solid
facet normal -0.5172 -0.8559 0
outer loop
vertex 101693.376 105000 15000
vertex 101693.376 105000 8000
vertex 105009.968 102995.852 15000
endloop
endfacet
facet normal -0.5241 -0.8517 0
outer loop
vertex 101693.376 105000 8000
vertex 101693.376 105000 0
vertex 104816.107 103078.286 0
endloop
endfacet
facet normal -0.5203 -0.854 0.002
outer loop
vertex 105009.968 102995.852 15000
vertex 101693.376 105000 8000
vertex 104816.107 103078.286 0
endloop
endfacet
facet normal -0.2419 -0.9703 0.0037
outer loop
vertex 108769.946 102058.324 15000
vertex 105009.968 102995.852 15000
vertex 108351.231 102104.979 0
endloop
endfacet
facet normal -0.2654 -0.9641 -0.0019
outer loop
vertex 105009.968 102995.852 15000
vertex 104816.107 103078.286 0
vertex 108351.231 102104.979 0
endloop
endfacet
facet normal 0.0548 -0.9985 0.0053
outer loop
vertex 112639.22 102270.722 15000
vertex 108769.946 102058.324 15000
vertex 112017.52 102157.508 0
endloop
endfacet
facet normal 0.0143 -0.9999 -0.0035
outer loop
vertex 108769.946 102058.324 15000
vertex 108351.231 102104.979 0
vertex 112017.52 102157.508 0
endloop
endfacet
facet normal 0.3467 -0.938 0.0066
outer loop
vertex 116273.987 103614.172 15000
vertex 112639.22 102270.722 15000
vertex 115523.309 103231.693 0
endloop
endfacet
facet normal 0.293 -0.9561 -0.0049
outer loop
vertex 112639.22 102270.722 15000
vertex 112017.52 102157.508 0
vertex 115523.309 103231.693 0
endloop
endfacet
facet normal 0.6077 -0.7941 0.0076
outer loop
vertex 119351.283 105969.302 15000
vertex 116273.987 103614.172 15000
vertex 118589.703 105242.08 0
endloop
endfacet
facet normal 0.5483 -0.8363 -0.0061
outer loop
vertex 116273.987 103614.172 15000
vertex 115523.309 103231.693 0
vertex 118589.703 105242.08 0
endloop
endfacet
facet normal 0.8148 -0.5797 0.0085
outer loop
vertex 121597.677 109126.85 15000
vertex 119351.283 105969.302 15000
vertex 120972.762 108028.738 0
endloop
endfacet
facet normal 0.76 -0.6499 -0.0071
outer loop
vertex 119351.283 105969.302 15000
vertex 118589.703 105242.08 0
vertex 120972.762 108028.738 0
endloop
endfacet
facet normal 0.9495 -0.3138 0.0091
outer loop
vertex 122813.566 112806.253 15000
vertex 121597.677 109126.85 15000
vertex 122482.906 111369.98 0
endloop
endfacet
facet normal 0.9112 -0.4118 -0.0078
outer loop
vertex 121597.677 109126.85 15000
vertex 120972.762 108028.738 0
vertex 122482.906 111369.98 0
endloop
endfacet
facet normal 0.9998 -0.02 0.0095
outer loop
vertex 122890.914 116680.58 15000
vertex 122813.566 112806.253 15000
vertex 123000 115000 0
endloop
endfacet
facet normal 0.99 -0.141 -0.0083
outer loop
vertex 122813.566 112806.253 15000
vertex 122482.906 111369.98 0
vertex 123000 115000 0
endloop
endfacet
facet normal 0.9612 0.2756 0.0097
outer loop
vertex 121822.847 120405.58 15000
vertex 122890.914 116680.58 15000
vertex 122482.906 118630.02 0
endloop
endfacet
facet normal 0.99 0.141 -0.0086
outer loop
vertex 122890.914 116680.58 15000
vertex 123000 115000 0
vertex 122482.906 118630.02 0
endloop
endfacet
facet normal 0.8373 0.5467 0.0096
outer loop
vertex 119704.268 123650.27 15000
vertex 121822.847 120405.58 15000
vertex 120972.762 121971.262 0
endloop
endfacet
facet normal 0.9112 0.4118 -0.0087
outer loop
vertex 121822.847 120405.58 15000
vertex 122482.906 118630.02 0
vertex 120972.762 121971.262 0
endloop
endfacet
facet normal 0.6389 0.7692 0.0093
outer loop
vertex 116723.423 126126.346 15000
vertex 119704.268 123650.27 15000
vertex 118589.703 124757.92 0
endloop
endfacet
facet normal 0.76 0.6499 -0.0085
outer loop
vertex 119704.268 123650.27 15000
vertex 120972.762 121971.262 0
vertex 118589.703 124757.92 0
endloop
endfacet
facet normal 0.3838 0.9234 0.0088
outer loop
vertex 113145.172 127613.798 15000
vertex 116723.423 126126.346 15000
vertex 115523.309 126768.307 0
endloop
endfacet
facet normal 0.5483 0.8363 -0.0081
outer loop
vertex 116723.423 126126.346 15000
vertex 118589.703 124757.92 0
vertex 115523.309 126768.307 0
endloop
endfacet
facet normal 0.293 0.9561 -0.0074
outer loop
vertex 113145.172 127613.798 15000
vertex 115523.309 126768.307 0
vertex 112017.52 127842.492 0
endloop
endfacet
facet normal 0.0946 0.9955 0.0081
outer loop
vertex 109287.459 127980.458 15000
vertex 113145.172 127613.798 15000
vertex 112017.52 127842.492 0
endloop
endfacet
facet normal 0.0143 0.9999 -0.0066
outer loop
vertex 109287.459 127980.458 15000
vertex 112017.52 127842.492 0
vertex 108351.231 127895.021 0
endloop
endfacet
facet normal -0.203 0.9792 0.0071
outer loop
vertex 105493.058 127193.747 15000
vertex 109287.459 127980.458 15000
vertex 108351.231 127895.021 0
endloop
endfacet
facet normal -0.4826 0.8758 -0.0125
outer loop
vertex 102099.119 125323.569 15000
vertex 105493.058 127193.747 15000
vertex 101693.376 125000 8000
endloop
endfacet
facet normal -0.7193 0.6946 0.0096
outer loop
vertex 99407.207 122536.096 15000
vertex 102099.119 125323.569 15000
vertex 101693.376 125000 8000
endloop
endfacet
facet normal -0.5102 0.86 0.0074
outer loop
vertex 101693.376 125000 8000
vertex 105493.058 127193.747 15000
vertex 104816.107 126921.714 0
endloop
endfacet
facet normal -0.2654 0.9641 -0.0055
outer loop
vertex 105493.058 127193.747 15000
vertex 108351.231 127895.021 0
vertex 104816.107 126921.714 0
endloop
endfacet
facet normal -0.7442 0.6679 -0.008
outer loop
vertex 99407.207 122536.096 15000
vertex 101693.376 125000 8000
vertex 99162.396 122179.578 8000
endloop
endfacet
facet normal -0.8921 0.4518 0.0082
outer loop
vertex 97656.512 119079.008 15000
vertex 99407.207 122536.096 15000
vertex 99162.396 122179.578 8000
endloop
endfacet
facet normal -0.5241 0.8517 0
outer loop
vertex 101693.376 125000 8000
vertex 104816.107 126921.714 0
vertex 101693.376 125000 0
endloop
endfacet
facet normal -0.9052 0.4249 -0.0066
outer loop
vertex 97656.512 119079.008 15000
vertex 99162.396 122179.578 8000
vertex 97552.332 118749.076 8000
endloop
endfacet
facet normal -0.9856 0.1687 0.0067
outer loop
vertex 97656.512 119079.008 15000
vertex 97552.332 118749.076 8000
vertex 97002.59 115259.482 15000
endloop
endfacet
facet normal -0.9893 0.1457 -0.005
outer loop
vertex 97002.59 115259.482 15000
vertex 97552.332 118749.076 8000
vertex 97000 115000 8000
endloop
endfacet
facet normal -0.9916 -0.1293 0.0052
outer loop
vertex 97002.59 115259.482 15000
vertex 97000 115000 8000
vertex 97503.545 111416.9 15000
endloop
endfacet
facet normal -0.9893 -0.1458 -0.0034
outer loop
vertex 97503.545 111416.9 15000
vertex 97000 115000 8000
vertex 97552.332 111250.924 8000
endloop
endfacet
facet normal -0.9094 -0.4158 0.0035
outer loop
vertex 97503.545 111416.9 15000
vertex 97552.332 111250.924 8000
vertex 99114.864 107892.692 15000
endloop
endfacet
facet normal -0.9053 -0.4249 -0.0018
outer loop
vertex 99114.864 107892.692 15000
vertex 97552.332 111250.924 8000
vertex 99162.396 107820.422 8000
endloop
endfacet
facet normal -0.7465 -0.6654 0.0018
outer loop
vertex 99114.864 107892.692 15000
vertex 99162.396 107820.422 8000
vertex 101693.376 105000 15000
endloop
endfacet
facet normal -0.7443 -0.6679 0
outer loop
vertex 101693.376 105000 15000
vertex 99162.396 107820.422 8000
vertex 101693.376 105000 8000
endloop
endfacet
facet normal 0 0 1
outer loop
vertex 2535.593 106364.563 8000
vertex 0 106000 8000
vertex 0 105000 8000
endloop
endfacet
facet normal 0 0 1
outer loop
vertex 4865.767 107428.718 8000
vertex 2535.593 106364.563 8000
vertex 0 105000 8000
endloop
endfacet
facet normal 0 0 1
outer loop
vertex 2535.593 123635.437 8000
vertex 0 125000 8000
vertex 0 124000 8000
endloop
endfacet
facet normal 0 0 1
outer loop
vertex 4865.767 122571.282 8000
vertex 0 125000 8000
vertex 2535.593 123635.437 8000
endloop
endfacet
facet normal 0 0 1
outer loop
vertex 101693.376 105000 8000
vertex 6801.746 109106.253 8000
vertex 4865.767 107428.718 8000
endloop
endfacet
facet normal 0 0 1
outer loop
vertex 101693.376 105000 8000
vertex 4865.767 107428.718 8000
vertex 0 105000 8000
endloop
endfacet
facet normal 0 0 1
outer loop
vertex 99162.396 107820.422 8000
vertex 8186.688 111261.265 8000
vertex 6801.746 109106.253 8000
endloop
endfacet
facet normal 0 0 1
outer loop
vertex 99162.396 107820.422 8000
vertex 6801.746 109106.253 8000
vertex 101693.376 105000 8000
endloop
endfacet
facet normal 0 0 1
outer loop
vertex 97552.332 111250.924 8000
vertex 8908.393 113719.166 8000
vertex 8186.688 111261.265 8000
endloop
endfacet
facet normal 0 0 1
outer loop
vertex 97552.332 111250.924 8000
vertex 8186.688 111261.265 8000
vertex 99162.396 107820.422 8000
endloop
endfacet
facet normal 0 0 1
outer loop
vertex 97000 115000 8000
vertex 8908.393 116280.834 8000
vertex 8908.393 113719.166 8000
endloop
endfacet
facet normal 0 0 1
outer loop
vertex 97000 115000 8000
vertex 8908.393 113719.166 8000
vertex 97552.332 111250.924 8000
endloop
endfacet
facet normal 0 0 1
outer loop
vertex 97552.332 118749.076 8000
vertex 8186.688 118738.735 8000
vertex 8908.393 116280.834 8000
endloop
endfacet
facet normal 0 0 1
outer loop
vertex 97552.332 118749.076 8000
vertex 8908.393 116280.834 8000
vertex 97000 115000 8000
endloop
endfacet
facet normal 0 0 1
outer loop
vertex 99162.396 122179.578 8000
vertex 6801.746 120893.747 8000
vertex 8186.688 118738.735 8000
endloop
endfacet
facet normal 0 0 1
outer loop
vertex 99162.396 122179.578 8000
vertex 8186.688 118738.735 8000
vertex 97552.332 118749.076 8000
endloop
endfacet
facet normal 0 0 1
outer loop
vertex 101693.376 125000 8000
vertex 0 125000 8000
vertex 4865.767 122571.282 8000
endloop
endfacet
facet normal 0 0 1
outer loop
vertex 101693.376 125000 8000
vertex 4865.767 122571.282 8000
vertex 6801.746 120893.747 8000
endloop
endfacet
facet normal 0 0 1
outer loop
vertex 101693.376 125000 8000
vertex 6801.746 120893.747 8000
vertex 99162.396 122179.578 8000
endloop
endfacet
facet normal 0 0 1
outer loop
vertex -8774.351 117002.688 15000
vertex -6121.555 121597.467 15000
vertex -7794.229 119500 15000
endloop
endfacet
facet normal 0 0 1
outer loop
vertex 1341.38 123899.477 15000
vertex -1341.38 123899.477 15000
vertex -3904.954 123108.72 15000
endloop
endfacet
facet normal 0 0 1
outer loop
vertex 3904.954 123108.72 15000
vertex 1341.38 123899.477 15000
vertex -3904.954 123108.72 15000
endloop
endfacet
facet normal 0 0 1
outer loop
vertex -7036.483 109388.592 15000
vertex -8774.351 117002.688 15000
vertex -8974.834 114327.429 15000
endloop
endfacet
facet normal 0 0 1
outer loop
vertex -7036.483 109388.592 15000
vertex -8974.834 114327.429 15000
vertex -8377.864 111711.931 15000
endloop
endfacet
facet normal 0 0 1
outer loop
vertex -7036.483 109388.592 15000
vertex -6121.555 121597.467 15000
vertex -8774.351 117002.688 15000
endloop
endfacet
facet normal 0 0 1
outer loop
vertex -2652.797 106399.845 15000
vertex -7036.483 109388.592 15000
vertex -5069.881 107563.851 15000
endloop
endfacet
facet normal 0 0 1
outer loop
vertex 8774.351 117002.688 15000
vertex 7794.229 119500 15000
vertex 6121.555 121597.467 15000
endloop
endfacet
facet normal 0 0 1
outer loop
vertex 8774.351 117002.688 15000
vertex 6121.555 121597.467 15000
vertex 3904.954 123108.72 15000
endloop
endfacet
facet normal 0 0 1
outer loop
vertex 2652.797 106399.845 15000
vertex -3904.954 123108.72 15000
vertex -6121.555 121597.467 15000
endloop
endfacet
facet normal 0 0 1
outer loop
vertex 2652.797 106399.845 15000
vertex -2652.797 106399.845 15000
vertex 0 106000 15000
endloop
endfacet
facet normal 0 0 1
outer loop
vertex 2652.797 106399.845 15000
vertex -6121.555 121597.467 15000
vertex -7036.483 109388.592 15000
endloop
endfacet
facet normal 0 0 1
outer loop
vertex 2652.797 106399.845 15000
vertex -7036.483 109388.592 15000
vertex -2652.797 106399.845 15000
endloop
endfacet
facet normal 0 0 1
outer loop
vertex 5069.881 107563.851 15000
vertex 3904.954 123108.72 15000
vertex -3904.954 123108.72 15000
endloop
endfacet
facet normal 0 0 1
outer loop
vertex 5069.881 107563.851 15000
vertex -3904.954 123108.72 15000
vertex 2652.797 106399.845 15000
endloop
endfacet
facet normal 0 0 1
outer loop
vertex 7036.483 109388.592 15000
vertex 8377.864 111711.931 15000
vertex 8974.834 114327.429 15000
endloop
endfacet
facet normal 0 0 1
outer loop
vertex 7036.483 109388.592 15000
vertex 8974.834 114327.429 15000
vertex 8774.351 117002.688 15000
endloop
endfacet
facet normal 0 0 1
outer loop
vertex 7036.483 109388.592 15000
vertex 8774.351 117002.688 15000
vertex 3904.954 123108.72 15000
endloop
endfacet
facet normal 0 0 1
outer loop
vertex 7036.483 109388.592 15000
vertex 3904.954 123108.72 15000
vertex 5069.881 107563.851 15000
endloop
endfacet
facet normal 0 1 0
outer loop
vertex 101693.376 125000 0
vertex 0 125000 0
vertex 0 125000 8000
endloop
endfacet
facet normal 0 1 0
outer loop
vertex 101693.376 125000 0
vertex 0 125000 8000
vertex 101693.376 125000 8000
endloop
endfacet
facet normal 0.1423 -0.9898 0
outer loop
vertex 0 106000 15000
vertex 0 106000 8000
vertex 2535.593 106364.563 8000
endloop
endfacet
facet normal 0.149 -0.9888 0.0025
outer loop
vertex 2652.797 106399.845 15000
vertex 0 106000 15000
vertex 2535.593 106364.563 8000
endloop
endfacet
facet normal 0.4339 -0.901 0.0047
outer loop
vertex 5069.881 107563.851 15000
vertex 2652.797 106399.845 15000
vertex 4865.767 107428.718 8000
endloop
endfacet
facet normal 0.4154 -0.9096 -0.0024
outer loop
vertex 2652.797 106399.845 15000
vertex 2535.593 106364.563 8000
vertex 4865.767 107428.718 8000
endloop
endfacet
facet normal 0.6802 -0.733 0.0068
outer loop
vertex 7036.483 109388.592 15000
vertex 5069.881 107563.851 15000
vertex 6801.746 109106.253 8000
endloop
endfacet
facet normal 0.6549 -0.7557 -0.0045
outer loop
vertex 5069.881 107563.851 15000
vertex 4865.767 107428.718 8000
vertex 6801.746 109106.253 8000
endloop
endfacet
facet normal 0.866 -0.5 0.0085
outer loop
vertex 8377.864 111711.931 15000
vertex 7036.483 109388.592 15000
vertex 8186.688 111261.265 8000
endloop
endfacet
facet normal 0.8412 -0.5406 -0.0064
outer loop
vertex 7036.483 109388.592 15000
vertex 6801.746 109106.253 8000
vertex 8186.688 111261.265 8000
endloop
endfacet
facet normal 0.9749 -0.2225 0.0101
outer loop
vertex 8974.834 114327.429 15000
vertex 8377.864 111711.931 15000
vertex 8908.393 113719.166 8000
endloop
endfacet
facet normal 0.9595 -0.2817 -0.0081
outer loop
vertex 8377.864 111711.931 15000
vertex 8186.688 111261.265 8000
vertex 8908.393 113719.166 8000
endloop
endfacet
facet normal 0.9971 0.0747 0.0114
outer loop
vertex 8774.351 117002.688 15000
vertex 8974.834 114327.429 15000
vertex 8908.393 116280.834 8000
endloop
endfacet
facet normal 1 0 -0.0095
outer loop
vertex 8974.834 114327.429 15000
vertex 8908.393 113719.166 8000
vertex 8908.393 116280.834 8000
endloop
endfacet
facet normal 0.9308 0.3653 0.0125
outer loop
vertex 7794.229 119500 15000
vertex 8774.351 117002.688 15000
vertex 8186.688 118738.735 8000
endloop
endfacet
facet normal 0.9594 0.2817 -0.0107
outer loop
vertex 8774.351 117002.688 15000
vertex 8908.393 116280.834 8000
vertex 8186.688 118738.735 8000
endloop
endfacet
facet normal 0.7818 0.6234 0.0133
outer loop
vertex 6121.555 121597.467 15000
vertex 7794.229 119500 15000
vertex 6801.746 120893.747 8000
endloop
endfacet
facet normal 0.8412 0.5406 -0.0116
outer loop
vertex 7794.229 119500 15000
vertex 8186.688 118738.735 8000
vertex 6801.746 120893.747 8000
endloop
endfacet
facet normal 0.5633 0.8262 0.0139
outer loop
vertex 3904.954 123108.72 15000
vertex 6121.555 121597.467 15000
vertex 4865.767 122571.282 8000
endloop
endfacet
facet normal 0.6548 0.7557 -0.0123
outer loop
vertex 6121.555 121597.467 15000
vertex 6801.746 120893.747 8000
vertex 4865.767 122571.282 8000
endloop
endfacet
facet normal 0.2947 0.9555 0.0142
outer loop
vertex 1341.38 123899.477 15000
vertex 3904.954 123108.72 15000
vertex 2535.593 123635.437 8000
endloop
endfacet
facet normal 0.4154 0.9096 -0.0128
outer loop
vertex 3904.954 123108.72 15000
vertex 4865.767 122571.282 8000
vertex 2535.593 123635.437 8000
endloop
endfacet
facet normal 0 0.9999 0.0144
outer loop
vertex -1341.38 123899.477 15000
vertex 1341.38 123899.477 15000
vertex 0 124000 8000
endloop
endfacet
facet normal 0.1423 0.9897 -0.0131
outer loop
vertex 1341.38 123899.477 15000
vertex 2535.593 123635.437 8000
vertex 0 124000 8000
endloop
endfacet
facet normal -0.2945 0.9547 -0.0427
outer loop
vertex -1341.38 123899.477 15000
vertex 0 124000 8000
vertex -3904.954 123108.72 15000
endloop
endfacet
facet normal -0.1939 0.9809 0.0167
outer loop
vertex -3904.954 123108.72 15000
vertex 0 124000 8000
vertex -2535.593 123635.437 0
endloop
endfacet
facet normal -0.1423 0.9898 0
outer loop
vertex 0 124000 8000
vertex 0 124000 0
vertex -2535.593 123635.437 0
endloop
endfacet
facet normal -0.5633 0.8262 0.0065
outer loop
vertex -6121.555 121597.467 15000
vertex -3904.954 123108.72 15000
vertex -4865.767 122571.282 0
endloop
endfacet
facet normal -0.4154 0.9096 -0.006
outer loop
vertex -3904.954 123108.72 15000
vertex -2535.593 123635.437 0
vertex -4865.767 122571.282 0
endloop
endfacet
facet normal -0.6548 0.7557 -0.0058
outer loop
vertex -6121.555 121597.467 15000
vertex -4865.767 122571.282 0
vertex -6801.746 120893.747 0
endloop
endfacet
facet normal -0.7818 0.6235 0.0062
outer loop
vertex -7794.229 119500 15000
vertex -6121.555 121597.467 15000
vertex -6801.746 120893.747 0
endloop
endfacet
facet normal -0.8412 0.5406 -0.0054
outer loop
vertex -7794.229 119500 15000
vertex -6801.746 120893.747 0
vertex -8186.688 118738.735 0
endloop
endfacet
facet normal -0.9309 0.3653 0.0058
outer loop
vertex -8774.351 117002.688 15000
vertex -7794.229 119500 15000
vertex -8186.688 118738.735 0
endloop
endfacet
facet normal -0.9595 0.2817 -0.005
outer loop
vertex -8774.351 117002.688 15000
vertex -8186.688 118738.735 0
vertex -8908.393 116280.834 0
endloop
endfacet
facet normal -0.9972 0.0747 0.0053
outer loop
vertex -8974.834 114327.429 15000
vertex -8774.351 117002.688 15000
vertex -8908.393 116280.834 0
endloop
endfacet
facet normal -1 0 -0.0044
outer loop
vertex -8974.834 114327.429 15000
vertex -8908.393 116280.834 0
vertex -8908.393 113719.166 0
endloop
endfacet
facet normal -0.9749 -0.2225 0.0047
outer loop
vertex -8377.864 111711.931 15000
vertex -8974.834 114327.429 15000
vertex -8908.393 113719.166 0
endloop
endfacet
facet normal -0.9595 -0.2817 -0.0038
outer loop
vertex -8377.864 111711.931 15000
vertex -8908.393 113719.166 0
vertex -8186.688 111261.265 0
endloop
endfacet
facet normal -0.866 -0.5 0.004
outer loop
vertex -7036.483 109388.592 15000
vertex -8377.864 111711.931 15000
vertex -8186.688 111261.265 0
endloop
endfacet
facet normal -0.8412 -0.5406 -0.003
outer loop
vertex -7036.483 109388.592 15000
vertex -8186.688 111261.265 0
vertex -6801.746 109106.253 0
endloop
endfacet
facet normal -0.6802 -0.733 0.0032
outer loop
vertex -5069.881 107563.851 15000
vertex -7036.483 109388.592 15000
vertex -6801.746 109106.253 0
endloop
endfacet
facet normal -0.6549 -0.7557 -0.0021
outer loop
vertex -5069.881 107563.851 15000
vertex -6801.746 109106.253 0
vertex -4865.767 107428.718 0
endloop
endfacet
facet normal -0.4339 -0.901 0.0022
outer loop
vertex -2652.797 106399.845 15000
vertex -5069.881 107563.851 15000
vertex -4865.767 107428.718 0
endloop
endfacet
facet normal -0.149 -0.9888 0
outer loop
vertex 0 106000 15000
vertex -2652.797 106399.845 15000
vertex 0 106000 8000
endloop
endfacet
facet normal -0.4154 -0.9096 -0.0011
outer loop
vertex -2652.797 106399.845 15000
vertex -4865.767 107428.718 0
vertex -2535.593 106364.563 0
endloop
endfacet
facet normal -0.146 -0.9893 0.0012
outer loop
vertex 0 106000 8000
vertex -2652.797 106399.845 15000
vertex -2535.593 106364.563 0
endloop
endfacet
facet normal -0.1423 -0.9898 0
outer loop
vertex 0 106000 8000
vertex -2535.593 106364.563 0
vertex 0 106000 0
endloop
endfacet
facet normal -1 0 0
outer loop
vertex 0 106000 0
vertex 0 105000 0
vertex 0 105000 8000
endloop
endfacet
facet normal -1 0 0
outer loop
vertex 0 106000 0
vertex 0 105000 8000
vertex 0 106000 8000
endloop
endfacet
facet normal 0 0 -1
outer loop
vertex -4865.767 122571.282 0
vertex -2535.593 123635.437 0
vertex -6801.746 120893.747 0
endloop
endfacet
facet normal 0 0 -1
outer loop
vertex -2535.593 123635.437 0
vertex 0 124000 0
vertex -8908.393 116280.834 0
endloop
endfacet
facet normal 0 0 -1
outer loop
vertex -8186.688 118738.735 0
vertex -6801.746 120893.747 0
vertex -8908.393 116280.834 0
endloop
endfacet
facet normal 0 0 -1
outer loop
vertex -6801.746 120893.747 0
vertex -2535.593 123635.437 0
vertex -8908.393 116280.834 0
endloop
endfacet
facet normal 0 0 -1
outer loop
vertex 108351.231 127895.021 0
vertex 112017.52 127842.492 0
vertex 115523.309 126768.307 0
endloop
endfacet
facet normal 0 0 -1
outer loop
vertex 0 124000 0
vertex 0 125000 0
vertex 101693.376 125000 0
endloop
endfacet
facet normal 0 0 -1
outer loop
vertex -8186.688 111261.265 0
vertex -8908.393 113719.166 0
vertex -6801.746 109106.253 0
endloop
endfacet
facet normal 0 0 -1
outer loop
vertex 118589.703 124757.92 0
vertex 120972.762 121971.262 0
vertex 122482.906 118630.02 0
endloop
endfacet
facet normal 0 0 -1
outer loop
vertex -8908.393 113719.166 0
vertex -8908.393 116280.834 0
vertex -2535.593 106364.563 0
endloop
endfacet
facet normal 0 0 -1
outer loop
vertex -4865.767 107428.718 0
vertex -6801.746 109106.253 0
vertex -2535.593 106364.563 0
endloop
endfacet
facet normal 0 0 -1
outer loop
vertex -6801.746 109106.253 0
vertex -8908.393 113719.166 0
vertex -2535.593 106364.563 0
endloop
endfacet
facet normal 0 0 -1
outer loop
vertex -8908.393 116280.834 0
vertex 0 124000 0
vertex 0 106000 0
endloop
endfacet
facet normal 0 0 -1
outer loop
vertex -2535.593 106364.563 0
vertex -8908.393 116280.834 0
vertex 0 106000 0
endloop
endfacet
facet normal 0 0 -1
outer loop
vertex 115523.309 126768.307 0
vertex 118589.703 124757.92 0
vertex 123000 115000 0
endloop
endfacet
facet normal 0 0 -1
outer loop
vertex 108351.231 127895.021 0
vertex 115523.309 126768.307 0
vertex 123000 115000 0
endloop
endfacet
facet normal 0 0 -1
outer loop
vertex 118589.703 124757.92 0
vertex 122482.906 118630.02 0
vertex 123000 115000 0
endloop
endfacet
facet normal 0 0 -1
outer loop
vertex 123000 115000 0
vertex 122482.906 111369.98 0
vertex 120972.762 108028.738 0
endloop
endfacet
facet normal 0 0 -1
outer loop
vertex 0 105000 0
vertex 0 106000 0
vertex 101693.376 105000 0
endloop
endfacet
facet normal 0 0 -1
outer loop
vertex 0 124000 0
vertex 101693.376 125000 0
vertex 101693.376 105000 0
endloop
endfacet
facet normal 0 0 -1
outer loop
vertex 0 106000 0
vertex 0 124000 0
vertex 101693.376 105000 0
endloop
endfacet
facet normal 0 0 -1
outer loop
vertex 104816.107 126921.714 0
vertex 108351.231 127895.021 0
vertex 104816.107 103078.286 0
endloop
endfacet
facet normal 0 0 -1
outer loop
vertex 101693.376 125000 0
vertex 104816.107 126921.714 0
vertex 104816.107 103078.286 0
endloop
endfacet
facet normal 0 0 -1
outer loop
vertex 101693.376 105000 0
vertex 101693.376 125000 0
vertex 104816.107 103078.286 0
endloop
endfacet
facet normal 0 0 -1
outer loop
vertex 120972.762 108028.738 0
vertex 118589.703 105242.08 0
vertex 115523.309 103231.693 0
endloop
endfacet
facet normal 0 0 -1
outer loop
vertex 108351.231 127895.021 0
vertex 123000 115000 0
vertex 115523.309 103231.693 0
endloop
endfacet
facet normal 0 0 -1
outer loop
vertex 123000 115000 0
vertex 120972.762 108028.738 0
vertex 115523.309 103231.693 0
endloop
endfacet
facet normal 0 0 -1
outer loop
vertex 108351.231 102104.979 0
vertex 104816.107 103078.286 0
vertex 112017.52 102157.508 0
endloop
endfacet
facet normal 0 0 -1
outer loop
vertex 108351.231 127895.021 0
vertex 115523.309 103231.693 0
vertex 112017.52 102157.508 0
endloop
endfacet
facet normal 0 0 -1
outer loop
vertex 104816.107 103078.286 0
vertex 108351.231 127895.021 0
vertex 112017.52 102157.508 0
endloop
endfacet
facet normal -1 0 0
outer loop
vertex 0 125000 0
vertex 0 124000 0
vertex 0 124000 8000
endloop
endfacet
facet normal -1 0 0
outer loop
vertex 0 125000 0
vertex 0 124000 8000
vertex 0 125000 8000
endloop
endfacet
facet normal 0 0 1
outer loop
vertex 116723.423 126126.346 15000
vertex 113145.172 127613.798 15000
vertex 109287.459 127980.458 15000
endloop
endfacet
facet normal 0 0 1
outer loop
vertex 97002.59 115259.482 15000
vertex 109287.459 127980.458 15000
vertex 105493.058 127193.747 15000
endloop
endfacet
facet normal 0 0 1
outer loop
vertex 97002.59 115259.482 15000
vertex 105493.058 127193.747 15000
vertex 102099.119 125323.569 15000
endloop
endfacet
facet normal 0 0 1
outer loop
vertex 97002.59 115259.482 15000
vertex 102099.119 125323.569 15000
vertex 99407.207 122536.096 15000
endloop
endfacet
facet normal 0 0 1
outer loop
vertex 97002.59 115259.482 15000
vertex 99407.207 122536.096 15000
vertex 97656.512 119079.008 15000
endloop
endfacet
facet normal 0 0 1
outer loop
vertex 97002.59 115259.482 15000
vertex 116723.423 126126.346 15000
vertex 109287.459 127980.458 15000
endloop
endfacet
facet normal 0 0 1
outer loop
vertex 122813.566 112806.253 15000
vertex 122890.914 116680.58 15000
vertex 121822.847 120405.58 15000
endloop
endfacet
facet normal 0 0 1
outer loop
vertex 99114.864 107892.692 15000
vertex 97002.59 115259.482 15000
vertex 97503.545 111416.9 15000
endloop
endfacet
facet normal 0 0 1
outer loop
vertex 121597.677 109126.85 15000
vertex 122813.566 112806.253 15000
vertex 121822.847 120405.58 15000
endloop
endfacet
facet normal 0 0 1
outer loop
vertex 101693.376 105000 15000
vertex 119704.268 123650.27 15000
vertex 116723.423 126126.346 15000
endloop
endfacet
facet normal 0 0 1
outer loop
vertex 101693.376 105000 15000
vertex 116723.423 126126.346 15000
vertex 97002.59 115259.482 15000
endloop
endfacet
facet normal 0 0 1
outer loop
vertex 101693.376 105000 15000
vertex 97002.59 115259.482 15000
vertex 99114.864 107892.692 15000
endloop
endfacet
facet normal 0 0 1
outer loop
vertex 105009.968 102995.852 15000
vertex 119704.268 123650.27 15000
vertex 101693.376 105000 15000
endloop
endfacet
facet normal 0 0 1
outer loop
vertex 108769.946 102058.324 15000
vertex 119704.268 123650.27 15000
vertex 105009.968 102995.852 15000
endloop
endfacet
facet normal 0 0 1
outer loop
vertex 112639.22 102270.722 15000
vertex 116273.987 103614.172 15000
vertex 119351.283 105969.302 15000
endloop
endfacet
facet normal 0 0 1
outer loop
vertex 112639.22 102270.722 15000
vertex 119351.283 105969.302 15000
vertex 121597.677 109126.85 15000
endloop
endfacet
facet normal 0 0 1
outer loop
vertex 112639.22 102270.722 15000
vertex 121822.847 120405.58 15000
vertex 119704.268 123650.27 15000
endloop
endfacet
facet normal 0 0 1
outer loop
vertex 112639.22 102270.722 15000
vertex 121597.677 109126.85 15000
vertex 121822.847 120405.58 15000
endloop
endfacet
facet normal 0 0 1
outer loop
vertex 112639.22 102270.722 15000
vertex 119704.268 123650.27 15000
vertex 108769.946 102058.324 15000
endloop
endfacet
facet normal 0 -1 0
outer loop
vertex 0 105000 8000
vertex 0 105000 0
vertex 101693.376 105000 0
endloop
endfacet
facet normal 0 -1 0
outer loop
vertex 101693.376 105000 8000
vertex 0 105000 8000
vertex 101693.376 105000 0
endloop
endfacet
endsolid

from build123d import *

# Parameters (mm, degrees)
SKETCH_1_W      = 110000
SKETCH_1_H      = 20000
EXTRUDE_1_DEPTH = 8000
SKETCH_2_R      = 9000
EXTRUDE_2_DEPTH = 15000
SKETCH_3_R      = 13000
EXTRUDE_3_DEPTH = 15000


with BuildPart() as part:
    # 草图1 → 凸台-拉伸1 (new body)
    with BuildSketch(Plane.XY):
        with Locations((55000, 115000)):
            Rectangle(SKETCH_1_W, SKETCH_1_H)
    extrude(amount=EXTRUDE_1_DEPTH)

    # 草图2 → 凸台-拉伸2 (add)
    with BuildSketch(Plane.XY):
        with Locations(Location((0, 115000, 0), (0, 0, 270))):
            Circle(SKETCH_2_R)
    extrude(amount=EXTRUDE_2_DEPTH)

    # 草图3 → 凸台-拉伸3 (add)
    with BuildSketch(Plane.XY):
        with Locations(Location((110000, 115000, 0), (0, 0, 230.284862768))):
            Circle(SKETCH_3_R)
    extrude(amount=EXTRUDE_3_DEPTH)


solid = part.part
